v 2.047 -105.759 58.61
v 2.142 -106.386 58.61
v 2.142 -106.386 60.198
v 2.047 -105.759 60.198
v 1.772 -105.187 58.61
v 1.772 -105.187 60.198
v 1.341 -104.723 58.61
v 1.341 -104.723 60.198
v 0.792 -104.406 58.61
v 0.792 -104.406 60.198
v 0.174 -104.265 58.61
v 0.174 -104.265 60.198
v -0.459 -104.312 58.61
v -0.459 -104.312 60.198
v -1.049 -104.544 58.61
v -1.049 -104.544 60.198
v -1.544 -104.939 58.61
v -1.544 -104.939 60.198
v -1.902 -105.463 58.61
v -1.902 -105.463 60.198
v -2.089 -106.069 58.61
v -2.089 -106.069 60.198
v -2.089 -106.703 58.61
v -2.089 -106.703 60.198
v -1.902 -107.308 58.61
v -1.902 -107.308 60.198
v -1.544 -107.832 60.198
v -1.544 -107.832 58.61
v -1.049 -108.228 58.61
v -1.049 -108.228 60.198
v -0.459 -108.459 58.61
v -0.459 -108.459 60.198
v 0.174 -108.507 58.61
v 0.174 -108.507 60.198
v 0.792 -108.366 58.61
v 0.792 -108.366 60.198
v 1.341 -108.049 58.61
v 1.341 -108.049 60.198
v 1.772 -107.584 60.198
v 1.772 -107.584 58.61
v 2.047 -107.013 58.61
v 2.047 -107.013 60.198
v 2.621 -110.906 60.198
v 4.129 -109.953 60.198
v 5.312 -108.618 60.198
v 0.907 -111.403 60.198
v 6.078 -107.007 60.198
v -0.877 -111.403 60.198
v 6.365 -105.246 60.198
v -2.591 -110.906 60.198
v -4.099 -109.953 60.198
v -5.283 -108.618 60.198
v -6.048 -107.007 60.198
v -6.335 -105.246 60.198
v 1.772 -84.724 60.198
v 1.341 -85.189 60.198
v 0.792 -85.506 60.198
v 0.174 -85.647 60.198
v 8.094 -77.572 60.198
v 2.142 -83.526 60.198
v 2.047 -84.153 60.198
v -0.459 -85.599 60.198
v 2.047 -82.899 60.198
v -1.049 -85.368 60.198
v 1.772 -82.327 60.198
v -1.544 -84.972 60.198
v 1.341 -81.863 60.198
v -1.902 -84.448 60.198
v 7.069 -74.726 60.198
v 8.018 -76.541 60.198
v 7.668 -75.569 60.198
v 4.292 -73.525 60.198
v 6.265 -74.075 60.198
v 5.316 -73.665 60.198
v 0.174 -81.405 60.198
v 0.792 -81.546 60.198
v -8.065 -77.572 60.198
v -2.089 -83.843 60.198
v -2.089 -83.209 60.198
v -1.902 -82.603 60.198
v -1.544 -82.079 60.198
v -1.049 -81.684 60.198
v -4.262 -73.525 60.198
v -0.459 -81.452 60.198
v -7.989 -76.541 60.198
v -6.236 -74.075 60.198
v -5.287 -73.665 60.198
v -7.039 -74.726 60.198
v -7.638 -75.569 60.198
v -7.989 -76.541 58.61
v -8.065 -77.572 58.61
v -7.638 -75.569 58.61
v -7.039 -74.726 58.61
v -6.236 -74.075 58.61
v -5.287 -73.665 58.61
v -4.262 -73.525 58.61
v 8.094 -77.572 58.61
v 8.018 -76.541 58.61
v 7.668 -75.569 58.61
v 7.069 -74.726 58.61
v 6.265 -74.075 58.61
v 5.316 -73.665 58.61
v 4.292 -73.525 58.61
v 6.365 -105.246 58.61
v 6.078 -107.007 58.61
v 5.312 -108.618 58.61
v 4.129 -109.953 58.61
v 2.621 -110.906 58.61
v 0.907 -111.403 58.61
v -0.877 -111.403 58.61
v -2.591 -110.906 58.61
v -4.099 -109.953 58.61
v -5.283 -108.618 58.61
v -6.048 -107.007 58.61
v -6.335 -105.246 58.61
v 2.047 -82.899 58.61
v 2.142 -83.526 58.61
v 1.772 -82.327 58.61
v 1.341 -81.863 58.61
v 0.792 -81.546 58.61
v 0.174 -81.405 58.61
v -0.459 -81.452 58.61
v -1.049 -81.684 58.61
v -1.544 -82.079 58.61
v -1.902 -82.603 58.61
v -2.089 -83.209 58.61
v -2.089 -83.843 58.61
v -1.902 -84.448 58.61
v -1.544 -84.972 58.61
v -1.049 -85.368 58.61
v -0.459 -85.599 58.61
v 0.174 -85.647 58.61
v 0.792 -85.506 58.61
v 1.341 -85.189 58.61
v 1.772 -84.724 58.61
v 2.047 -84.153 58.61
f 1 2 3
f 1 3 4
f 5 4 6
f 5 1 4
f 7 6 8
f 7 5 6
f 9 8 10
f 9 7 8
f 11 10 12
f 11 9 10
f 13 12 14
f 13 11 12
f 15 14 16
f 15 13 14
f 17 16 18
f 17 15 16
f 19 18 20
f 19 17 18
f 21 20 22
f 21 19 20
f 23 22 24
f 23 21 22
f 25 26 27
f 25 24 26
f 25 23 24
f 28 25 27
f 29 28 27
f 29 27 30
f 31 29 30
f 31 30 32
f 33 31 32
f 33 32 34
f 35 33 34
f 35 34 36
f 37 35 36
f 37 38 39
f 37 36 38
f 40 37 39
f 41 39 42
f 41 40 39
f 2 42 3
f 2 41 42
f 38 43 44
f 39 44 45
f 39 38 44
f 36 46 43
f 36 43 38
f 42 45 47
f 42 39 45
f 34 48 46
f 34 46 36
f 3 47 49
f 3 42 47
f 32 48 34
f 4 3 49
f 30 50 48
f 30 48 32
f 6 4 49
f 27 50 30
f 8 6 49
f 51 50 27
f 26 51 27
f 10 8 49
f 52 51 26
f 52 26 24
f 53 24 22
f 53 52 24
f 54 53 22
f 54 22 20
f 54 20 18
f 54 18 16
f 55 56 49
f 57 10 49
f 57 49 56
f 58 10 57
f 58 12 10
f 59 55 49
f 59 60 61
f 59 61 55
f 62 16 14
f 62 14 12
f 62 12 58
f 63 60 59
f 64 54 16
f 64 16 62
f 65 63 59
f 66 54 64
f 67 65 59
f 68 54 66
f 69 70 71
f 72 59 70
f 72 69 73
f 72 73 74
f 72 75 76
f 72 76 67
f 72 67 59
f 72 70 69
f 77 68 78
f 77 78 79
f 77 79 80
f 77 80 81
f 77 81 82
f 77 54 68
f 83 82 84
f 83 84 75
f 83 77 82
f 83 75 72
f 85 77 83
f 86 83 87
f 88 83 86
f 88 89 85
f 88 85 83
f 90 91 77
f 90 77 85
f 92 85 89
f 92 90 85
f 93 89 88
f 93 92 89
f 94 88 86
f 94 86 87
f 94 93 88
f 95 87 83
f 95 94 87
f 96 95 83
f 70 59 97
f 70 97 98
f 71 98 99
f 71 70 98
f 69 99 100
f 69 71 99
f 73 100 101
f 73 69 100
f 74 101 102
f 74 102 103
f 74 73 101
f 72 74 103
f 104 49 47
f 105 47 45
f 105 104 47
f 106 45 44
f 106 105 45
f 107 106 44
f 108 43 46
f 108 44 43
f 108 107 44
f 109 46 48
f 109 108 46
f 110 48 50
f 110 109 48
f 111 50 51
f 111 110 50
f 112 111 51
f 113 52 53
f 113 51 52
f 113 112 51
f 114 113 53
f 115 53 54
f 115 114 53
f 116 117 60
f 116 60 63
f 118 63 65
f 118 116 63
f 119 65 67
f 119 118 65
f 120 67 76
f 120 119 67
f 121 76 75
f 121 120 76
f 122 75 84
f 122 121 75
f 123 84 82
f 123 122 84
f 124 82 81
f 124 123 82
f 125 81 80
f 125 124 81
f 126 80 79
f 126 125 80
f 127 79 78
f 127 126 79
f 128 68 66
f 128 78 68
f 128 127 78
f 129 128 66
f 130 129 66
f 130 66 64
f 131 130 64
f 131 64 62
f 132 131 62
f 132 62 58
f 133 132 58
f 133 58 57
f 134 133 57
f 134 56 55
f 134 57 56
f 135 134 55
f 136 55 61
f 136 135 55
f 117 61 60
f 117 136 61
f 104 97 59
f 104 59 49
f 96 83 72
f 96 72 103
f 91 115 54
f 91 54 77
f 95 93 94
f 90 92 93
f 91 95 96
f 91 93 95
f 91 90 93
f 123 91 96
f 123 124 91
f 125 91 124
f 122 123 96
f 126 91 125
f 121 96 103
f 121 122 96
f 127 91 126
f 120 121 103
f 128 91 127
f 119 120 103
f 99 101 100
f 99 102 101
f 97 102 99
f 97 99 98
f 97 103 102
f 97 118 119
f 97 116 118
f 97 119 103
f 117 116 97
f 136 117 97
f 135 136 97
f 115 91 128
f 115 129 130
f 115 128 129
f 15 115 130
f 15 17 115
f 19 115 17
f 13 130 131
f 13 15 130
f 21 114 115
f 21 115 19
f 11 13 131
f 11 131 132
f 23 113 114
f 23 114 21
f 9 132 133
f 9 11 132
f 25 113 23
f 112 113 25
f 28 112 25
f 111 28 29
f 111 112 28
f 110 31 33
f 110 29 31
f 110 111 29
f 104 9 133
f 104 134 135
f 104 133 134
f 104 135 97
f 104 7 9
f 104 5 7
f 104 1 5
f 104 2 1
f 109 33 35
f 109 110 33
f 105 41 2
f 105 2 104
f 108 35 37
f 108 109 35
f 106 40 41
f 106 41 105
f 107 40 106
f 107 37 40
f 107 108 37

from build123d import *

# Parameters (mm, degrees)
BOSS_EXTRUDE1_DEPTH      = 76.2
BOSS_EXTRUDE1_DEPTH_BACK = 76.2
CUT_EXTRUDE1_DEPTH       = 136.619651209
CUT_EXTRUDE1_DEPTH_BACK  = 136.619651209
FILLET1_R                = 3.81
SHELL1_START             = -44.45
SHELL1_DEPTH             = 88.773
SHELL1_START_2           = -73.025
SHELL1_2_DEPTH           = 130.048
CUT_EXTRUDE2_DEPTH       = 136.355460931
CUT_EXTRUDE2_DEPTH_BACK  = 136.355460931
SKETCH8_W                = 51.042359072
SKETCH8_H                = 158.808122299
CUT_EXTRUDE3_DEPTH       = 112.770943321
CUT_EXTRUDE3_DEPTH_BACK  = 112.770943321
SKETCH9_R                = 2.127


# Read off the part's stored shape, not the designer's step: Shell1
with BuildPart() as part:
    # Sketch1 → Boss-Extrude1 (new, two sides: drawn at the far end of the back side and taken through both)
    with BuildSketch(Plane.XY.offset(-BOSS_EXTRUDE1_DEPTH_BACK)):
        with BuildLine():
            Line((-6.335258536, -105.245804705), (-12.685258536, -3.645804705))
            ThreePointArc((-12.685258536, -3.645804705), (0.014741464, 8.866413132), (12.714741464, -3.645804705))
            Line((12.714741464, -3.645804705), (6.364741464, -105.245804705))
            ThreePointArc((6.364741464, -105.245804705), (0.014741464, -111.465623147), (-6.335258536, -105.245804705))
        make_face()
    extrude(amount=BOSS_EXTRUDE1_DEPTH + BOSS_EXTRUDE1_DEPTH_BACK)

    # Sketch4 → Cut-Extrude1 (cut, two sides: drawn at the far end of the back side and taken through both)
    with BuildSketch(Plane(origin=(0, 0, 0), x_dir=(0, 0, -1), z_dir=(1, 0, 0)).offset(-CUT_EXTRUDE1_DEPTH_BACK)):
        Polygon((-47.498, -73.524605007), (-47.498, -51.299605007), (47.625, -51.299605007), (47.625, -73.524605007), (76.2, -73.524605007), (76.2, 8.866413132), (-76.2, 8.866413132), (-76.2, -28.682279346), (-76.2, -111.465623147), (-60.198, -111.465623147), (-60.198, -73.524605007), align=None)
    extrude(amount=CUT_EXTRUDE1_DEPTH + CUT_EXTRUDE1_DEPTH_BACK, mode=Mode.SUBTRACT)

    # Fillet1
    fillet1_edges = [part.edges().sort_by_distance(p)[0] for p in [
        (8.347316445, -73.524605007, 53.848),
        (9.736378945, -51.299605007, -0.0635),
        (-9.706896017, -51.299605007, -0.0635),
        (-8.317833517, -73.524605007, 53.848),
        (-8.317833517, -73.524605007, -61.9125),
        (8.347316445, -73.524605007, -61.9125),
    ]]
    fillet(fillet1_edges, radius=FILLET1_R)

    # Shell1 outline → Shell1 (cut)
    with BuildSketch(Plane.XY.offset(SHELL1_START)):
        with BuildLine():
            ThreePointArc((-3.161602106, -105.125185529), (0.014741465, -108.290623147), (3.191085035, -105.125185529))
            Line((3.191085035, -105.125185529), (6.314583179, -55.149215219))
            ThreePointArc((6.314583179, -55.149215219), (6.143625088, -54.674822007), (5.680819792, -54.474605007))
            Line((5.680819792, -54.474605007), (-5.651336863, -54.474605007))
            ThreePointArc((-5.651336863, -54.474605007), (-6.114142159, -54.674822006), (-6.285100251, -55.149215219))
            Line((-6.285100251, -55.149215219), (-3.161602106, -105.125185529))
        make_face()
    extrude(amount=SHELL1_DEPTH, mode=Mode.SUBTRACT)

    # Shell1 2 outline → Shell1 2 (cut)
    with BuildSketch(Plane.XY.offset(SHELL1_START_2)):
        with BuildLine():
            Line((-4.896037751, -77.374215219), (-3.161602106, -105.125185529))
            ThreePointArc((-3.161602106, -105.125185529), (0.014741465, -108.290623147), (3.191085035, -105.125185529))
            Line((3.191085035, -105.125185529), (4.925520679, -77.374215219))
            ThreePointArc((4.925520679, -77.374215219), (4.754562588, -76.899822007), (4.291757292, -76.699605007))
            Line((4.291757292, -76.699605007), (-4.262274363, -76.699605007))
            ThreePointArc((-4.262274363, -76.699605007), (-4.725079659, -76.899822006), (-4.896037751, -77.374215219))
        make_face()
    extrude(amount=SHELL1_2_DEPTH, mode=Mode.SUBTRACT)

    # Sketch8 → Cut-Extrude2 (cut, two sides: drawn at the far end of the back side and taken through both)
    with BuildSketch(Plane(origin=(0, 0, 0), x_dir=(1, 0, 0), z_dir=(0, 1, 0)).offset(-CUT_EXTRUDE2_DEPTH_BACK)):
        with Locations((-7.309443233, 20.79356115)):
            Rectangle(SKETCH8_W, SKETCH8_H)
    extrude(amount=CUT_EXTRUDE2_DEPTH + CUT_EXTRUDE2_DEPTH_BACK, mode=Mode.SUBTRACT)

    # Sketch9 → Cut-Extrude3 (cut, two sides: drawn at the far end of the back side and taken through both)
    with BuildSketch(Plane.XY.offset(60.198).offset(-CUT_EXTRUDE3_DEPTH_BACK)):
        with Locations((0.014741464, -106.385623147)):
            Circle(SKETCH9_R)
        with Locations((0.014741464, -83.525623147)):
            Circle(SKETCH9_R)
    extrude(amount=CUT_EXTRUDE3_DEPTH + CUT_EXTRUDE3_DEPTH_BACK, mode=Mode.SUBTRACT)


solid = part.part
